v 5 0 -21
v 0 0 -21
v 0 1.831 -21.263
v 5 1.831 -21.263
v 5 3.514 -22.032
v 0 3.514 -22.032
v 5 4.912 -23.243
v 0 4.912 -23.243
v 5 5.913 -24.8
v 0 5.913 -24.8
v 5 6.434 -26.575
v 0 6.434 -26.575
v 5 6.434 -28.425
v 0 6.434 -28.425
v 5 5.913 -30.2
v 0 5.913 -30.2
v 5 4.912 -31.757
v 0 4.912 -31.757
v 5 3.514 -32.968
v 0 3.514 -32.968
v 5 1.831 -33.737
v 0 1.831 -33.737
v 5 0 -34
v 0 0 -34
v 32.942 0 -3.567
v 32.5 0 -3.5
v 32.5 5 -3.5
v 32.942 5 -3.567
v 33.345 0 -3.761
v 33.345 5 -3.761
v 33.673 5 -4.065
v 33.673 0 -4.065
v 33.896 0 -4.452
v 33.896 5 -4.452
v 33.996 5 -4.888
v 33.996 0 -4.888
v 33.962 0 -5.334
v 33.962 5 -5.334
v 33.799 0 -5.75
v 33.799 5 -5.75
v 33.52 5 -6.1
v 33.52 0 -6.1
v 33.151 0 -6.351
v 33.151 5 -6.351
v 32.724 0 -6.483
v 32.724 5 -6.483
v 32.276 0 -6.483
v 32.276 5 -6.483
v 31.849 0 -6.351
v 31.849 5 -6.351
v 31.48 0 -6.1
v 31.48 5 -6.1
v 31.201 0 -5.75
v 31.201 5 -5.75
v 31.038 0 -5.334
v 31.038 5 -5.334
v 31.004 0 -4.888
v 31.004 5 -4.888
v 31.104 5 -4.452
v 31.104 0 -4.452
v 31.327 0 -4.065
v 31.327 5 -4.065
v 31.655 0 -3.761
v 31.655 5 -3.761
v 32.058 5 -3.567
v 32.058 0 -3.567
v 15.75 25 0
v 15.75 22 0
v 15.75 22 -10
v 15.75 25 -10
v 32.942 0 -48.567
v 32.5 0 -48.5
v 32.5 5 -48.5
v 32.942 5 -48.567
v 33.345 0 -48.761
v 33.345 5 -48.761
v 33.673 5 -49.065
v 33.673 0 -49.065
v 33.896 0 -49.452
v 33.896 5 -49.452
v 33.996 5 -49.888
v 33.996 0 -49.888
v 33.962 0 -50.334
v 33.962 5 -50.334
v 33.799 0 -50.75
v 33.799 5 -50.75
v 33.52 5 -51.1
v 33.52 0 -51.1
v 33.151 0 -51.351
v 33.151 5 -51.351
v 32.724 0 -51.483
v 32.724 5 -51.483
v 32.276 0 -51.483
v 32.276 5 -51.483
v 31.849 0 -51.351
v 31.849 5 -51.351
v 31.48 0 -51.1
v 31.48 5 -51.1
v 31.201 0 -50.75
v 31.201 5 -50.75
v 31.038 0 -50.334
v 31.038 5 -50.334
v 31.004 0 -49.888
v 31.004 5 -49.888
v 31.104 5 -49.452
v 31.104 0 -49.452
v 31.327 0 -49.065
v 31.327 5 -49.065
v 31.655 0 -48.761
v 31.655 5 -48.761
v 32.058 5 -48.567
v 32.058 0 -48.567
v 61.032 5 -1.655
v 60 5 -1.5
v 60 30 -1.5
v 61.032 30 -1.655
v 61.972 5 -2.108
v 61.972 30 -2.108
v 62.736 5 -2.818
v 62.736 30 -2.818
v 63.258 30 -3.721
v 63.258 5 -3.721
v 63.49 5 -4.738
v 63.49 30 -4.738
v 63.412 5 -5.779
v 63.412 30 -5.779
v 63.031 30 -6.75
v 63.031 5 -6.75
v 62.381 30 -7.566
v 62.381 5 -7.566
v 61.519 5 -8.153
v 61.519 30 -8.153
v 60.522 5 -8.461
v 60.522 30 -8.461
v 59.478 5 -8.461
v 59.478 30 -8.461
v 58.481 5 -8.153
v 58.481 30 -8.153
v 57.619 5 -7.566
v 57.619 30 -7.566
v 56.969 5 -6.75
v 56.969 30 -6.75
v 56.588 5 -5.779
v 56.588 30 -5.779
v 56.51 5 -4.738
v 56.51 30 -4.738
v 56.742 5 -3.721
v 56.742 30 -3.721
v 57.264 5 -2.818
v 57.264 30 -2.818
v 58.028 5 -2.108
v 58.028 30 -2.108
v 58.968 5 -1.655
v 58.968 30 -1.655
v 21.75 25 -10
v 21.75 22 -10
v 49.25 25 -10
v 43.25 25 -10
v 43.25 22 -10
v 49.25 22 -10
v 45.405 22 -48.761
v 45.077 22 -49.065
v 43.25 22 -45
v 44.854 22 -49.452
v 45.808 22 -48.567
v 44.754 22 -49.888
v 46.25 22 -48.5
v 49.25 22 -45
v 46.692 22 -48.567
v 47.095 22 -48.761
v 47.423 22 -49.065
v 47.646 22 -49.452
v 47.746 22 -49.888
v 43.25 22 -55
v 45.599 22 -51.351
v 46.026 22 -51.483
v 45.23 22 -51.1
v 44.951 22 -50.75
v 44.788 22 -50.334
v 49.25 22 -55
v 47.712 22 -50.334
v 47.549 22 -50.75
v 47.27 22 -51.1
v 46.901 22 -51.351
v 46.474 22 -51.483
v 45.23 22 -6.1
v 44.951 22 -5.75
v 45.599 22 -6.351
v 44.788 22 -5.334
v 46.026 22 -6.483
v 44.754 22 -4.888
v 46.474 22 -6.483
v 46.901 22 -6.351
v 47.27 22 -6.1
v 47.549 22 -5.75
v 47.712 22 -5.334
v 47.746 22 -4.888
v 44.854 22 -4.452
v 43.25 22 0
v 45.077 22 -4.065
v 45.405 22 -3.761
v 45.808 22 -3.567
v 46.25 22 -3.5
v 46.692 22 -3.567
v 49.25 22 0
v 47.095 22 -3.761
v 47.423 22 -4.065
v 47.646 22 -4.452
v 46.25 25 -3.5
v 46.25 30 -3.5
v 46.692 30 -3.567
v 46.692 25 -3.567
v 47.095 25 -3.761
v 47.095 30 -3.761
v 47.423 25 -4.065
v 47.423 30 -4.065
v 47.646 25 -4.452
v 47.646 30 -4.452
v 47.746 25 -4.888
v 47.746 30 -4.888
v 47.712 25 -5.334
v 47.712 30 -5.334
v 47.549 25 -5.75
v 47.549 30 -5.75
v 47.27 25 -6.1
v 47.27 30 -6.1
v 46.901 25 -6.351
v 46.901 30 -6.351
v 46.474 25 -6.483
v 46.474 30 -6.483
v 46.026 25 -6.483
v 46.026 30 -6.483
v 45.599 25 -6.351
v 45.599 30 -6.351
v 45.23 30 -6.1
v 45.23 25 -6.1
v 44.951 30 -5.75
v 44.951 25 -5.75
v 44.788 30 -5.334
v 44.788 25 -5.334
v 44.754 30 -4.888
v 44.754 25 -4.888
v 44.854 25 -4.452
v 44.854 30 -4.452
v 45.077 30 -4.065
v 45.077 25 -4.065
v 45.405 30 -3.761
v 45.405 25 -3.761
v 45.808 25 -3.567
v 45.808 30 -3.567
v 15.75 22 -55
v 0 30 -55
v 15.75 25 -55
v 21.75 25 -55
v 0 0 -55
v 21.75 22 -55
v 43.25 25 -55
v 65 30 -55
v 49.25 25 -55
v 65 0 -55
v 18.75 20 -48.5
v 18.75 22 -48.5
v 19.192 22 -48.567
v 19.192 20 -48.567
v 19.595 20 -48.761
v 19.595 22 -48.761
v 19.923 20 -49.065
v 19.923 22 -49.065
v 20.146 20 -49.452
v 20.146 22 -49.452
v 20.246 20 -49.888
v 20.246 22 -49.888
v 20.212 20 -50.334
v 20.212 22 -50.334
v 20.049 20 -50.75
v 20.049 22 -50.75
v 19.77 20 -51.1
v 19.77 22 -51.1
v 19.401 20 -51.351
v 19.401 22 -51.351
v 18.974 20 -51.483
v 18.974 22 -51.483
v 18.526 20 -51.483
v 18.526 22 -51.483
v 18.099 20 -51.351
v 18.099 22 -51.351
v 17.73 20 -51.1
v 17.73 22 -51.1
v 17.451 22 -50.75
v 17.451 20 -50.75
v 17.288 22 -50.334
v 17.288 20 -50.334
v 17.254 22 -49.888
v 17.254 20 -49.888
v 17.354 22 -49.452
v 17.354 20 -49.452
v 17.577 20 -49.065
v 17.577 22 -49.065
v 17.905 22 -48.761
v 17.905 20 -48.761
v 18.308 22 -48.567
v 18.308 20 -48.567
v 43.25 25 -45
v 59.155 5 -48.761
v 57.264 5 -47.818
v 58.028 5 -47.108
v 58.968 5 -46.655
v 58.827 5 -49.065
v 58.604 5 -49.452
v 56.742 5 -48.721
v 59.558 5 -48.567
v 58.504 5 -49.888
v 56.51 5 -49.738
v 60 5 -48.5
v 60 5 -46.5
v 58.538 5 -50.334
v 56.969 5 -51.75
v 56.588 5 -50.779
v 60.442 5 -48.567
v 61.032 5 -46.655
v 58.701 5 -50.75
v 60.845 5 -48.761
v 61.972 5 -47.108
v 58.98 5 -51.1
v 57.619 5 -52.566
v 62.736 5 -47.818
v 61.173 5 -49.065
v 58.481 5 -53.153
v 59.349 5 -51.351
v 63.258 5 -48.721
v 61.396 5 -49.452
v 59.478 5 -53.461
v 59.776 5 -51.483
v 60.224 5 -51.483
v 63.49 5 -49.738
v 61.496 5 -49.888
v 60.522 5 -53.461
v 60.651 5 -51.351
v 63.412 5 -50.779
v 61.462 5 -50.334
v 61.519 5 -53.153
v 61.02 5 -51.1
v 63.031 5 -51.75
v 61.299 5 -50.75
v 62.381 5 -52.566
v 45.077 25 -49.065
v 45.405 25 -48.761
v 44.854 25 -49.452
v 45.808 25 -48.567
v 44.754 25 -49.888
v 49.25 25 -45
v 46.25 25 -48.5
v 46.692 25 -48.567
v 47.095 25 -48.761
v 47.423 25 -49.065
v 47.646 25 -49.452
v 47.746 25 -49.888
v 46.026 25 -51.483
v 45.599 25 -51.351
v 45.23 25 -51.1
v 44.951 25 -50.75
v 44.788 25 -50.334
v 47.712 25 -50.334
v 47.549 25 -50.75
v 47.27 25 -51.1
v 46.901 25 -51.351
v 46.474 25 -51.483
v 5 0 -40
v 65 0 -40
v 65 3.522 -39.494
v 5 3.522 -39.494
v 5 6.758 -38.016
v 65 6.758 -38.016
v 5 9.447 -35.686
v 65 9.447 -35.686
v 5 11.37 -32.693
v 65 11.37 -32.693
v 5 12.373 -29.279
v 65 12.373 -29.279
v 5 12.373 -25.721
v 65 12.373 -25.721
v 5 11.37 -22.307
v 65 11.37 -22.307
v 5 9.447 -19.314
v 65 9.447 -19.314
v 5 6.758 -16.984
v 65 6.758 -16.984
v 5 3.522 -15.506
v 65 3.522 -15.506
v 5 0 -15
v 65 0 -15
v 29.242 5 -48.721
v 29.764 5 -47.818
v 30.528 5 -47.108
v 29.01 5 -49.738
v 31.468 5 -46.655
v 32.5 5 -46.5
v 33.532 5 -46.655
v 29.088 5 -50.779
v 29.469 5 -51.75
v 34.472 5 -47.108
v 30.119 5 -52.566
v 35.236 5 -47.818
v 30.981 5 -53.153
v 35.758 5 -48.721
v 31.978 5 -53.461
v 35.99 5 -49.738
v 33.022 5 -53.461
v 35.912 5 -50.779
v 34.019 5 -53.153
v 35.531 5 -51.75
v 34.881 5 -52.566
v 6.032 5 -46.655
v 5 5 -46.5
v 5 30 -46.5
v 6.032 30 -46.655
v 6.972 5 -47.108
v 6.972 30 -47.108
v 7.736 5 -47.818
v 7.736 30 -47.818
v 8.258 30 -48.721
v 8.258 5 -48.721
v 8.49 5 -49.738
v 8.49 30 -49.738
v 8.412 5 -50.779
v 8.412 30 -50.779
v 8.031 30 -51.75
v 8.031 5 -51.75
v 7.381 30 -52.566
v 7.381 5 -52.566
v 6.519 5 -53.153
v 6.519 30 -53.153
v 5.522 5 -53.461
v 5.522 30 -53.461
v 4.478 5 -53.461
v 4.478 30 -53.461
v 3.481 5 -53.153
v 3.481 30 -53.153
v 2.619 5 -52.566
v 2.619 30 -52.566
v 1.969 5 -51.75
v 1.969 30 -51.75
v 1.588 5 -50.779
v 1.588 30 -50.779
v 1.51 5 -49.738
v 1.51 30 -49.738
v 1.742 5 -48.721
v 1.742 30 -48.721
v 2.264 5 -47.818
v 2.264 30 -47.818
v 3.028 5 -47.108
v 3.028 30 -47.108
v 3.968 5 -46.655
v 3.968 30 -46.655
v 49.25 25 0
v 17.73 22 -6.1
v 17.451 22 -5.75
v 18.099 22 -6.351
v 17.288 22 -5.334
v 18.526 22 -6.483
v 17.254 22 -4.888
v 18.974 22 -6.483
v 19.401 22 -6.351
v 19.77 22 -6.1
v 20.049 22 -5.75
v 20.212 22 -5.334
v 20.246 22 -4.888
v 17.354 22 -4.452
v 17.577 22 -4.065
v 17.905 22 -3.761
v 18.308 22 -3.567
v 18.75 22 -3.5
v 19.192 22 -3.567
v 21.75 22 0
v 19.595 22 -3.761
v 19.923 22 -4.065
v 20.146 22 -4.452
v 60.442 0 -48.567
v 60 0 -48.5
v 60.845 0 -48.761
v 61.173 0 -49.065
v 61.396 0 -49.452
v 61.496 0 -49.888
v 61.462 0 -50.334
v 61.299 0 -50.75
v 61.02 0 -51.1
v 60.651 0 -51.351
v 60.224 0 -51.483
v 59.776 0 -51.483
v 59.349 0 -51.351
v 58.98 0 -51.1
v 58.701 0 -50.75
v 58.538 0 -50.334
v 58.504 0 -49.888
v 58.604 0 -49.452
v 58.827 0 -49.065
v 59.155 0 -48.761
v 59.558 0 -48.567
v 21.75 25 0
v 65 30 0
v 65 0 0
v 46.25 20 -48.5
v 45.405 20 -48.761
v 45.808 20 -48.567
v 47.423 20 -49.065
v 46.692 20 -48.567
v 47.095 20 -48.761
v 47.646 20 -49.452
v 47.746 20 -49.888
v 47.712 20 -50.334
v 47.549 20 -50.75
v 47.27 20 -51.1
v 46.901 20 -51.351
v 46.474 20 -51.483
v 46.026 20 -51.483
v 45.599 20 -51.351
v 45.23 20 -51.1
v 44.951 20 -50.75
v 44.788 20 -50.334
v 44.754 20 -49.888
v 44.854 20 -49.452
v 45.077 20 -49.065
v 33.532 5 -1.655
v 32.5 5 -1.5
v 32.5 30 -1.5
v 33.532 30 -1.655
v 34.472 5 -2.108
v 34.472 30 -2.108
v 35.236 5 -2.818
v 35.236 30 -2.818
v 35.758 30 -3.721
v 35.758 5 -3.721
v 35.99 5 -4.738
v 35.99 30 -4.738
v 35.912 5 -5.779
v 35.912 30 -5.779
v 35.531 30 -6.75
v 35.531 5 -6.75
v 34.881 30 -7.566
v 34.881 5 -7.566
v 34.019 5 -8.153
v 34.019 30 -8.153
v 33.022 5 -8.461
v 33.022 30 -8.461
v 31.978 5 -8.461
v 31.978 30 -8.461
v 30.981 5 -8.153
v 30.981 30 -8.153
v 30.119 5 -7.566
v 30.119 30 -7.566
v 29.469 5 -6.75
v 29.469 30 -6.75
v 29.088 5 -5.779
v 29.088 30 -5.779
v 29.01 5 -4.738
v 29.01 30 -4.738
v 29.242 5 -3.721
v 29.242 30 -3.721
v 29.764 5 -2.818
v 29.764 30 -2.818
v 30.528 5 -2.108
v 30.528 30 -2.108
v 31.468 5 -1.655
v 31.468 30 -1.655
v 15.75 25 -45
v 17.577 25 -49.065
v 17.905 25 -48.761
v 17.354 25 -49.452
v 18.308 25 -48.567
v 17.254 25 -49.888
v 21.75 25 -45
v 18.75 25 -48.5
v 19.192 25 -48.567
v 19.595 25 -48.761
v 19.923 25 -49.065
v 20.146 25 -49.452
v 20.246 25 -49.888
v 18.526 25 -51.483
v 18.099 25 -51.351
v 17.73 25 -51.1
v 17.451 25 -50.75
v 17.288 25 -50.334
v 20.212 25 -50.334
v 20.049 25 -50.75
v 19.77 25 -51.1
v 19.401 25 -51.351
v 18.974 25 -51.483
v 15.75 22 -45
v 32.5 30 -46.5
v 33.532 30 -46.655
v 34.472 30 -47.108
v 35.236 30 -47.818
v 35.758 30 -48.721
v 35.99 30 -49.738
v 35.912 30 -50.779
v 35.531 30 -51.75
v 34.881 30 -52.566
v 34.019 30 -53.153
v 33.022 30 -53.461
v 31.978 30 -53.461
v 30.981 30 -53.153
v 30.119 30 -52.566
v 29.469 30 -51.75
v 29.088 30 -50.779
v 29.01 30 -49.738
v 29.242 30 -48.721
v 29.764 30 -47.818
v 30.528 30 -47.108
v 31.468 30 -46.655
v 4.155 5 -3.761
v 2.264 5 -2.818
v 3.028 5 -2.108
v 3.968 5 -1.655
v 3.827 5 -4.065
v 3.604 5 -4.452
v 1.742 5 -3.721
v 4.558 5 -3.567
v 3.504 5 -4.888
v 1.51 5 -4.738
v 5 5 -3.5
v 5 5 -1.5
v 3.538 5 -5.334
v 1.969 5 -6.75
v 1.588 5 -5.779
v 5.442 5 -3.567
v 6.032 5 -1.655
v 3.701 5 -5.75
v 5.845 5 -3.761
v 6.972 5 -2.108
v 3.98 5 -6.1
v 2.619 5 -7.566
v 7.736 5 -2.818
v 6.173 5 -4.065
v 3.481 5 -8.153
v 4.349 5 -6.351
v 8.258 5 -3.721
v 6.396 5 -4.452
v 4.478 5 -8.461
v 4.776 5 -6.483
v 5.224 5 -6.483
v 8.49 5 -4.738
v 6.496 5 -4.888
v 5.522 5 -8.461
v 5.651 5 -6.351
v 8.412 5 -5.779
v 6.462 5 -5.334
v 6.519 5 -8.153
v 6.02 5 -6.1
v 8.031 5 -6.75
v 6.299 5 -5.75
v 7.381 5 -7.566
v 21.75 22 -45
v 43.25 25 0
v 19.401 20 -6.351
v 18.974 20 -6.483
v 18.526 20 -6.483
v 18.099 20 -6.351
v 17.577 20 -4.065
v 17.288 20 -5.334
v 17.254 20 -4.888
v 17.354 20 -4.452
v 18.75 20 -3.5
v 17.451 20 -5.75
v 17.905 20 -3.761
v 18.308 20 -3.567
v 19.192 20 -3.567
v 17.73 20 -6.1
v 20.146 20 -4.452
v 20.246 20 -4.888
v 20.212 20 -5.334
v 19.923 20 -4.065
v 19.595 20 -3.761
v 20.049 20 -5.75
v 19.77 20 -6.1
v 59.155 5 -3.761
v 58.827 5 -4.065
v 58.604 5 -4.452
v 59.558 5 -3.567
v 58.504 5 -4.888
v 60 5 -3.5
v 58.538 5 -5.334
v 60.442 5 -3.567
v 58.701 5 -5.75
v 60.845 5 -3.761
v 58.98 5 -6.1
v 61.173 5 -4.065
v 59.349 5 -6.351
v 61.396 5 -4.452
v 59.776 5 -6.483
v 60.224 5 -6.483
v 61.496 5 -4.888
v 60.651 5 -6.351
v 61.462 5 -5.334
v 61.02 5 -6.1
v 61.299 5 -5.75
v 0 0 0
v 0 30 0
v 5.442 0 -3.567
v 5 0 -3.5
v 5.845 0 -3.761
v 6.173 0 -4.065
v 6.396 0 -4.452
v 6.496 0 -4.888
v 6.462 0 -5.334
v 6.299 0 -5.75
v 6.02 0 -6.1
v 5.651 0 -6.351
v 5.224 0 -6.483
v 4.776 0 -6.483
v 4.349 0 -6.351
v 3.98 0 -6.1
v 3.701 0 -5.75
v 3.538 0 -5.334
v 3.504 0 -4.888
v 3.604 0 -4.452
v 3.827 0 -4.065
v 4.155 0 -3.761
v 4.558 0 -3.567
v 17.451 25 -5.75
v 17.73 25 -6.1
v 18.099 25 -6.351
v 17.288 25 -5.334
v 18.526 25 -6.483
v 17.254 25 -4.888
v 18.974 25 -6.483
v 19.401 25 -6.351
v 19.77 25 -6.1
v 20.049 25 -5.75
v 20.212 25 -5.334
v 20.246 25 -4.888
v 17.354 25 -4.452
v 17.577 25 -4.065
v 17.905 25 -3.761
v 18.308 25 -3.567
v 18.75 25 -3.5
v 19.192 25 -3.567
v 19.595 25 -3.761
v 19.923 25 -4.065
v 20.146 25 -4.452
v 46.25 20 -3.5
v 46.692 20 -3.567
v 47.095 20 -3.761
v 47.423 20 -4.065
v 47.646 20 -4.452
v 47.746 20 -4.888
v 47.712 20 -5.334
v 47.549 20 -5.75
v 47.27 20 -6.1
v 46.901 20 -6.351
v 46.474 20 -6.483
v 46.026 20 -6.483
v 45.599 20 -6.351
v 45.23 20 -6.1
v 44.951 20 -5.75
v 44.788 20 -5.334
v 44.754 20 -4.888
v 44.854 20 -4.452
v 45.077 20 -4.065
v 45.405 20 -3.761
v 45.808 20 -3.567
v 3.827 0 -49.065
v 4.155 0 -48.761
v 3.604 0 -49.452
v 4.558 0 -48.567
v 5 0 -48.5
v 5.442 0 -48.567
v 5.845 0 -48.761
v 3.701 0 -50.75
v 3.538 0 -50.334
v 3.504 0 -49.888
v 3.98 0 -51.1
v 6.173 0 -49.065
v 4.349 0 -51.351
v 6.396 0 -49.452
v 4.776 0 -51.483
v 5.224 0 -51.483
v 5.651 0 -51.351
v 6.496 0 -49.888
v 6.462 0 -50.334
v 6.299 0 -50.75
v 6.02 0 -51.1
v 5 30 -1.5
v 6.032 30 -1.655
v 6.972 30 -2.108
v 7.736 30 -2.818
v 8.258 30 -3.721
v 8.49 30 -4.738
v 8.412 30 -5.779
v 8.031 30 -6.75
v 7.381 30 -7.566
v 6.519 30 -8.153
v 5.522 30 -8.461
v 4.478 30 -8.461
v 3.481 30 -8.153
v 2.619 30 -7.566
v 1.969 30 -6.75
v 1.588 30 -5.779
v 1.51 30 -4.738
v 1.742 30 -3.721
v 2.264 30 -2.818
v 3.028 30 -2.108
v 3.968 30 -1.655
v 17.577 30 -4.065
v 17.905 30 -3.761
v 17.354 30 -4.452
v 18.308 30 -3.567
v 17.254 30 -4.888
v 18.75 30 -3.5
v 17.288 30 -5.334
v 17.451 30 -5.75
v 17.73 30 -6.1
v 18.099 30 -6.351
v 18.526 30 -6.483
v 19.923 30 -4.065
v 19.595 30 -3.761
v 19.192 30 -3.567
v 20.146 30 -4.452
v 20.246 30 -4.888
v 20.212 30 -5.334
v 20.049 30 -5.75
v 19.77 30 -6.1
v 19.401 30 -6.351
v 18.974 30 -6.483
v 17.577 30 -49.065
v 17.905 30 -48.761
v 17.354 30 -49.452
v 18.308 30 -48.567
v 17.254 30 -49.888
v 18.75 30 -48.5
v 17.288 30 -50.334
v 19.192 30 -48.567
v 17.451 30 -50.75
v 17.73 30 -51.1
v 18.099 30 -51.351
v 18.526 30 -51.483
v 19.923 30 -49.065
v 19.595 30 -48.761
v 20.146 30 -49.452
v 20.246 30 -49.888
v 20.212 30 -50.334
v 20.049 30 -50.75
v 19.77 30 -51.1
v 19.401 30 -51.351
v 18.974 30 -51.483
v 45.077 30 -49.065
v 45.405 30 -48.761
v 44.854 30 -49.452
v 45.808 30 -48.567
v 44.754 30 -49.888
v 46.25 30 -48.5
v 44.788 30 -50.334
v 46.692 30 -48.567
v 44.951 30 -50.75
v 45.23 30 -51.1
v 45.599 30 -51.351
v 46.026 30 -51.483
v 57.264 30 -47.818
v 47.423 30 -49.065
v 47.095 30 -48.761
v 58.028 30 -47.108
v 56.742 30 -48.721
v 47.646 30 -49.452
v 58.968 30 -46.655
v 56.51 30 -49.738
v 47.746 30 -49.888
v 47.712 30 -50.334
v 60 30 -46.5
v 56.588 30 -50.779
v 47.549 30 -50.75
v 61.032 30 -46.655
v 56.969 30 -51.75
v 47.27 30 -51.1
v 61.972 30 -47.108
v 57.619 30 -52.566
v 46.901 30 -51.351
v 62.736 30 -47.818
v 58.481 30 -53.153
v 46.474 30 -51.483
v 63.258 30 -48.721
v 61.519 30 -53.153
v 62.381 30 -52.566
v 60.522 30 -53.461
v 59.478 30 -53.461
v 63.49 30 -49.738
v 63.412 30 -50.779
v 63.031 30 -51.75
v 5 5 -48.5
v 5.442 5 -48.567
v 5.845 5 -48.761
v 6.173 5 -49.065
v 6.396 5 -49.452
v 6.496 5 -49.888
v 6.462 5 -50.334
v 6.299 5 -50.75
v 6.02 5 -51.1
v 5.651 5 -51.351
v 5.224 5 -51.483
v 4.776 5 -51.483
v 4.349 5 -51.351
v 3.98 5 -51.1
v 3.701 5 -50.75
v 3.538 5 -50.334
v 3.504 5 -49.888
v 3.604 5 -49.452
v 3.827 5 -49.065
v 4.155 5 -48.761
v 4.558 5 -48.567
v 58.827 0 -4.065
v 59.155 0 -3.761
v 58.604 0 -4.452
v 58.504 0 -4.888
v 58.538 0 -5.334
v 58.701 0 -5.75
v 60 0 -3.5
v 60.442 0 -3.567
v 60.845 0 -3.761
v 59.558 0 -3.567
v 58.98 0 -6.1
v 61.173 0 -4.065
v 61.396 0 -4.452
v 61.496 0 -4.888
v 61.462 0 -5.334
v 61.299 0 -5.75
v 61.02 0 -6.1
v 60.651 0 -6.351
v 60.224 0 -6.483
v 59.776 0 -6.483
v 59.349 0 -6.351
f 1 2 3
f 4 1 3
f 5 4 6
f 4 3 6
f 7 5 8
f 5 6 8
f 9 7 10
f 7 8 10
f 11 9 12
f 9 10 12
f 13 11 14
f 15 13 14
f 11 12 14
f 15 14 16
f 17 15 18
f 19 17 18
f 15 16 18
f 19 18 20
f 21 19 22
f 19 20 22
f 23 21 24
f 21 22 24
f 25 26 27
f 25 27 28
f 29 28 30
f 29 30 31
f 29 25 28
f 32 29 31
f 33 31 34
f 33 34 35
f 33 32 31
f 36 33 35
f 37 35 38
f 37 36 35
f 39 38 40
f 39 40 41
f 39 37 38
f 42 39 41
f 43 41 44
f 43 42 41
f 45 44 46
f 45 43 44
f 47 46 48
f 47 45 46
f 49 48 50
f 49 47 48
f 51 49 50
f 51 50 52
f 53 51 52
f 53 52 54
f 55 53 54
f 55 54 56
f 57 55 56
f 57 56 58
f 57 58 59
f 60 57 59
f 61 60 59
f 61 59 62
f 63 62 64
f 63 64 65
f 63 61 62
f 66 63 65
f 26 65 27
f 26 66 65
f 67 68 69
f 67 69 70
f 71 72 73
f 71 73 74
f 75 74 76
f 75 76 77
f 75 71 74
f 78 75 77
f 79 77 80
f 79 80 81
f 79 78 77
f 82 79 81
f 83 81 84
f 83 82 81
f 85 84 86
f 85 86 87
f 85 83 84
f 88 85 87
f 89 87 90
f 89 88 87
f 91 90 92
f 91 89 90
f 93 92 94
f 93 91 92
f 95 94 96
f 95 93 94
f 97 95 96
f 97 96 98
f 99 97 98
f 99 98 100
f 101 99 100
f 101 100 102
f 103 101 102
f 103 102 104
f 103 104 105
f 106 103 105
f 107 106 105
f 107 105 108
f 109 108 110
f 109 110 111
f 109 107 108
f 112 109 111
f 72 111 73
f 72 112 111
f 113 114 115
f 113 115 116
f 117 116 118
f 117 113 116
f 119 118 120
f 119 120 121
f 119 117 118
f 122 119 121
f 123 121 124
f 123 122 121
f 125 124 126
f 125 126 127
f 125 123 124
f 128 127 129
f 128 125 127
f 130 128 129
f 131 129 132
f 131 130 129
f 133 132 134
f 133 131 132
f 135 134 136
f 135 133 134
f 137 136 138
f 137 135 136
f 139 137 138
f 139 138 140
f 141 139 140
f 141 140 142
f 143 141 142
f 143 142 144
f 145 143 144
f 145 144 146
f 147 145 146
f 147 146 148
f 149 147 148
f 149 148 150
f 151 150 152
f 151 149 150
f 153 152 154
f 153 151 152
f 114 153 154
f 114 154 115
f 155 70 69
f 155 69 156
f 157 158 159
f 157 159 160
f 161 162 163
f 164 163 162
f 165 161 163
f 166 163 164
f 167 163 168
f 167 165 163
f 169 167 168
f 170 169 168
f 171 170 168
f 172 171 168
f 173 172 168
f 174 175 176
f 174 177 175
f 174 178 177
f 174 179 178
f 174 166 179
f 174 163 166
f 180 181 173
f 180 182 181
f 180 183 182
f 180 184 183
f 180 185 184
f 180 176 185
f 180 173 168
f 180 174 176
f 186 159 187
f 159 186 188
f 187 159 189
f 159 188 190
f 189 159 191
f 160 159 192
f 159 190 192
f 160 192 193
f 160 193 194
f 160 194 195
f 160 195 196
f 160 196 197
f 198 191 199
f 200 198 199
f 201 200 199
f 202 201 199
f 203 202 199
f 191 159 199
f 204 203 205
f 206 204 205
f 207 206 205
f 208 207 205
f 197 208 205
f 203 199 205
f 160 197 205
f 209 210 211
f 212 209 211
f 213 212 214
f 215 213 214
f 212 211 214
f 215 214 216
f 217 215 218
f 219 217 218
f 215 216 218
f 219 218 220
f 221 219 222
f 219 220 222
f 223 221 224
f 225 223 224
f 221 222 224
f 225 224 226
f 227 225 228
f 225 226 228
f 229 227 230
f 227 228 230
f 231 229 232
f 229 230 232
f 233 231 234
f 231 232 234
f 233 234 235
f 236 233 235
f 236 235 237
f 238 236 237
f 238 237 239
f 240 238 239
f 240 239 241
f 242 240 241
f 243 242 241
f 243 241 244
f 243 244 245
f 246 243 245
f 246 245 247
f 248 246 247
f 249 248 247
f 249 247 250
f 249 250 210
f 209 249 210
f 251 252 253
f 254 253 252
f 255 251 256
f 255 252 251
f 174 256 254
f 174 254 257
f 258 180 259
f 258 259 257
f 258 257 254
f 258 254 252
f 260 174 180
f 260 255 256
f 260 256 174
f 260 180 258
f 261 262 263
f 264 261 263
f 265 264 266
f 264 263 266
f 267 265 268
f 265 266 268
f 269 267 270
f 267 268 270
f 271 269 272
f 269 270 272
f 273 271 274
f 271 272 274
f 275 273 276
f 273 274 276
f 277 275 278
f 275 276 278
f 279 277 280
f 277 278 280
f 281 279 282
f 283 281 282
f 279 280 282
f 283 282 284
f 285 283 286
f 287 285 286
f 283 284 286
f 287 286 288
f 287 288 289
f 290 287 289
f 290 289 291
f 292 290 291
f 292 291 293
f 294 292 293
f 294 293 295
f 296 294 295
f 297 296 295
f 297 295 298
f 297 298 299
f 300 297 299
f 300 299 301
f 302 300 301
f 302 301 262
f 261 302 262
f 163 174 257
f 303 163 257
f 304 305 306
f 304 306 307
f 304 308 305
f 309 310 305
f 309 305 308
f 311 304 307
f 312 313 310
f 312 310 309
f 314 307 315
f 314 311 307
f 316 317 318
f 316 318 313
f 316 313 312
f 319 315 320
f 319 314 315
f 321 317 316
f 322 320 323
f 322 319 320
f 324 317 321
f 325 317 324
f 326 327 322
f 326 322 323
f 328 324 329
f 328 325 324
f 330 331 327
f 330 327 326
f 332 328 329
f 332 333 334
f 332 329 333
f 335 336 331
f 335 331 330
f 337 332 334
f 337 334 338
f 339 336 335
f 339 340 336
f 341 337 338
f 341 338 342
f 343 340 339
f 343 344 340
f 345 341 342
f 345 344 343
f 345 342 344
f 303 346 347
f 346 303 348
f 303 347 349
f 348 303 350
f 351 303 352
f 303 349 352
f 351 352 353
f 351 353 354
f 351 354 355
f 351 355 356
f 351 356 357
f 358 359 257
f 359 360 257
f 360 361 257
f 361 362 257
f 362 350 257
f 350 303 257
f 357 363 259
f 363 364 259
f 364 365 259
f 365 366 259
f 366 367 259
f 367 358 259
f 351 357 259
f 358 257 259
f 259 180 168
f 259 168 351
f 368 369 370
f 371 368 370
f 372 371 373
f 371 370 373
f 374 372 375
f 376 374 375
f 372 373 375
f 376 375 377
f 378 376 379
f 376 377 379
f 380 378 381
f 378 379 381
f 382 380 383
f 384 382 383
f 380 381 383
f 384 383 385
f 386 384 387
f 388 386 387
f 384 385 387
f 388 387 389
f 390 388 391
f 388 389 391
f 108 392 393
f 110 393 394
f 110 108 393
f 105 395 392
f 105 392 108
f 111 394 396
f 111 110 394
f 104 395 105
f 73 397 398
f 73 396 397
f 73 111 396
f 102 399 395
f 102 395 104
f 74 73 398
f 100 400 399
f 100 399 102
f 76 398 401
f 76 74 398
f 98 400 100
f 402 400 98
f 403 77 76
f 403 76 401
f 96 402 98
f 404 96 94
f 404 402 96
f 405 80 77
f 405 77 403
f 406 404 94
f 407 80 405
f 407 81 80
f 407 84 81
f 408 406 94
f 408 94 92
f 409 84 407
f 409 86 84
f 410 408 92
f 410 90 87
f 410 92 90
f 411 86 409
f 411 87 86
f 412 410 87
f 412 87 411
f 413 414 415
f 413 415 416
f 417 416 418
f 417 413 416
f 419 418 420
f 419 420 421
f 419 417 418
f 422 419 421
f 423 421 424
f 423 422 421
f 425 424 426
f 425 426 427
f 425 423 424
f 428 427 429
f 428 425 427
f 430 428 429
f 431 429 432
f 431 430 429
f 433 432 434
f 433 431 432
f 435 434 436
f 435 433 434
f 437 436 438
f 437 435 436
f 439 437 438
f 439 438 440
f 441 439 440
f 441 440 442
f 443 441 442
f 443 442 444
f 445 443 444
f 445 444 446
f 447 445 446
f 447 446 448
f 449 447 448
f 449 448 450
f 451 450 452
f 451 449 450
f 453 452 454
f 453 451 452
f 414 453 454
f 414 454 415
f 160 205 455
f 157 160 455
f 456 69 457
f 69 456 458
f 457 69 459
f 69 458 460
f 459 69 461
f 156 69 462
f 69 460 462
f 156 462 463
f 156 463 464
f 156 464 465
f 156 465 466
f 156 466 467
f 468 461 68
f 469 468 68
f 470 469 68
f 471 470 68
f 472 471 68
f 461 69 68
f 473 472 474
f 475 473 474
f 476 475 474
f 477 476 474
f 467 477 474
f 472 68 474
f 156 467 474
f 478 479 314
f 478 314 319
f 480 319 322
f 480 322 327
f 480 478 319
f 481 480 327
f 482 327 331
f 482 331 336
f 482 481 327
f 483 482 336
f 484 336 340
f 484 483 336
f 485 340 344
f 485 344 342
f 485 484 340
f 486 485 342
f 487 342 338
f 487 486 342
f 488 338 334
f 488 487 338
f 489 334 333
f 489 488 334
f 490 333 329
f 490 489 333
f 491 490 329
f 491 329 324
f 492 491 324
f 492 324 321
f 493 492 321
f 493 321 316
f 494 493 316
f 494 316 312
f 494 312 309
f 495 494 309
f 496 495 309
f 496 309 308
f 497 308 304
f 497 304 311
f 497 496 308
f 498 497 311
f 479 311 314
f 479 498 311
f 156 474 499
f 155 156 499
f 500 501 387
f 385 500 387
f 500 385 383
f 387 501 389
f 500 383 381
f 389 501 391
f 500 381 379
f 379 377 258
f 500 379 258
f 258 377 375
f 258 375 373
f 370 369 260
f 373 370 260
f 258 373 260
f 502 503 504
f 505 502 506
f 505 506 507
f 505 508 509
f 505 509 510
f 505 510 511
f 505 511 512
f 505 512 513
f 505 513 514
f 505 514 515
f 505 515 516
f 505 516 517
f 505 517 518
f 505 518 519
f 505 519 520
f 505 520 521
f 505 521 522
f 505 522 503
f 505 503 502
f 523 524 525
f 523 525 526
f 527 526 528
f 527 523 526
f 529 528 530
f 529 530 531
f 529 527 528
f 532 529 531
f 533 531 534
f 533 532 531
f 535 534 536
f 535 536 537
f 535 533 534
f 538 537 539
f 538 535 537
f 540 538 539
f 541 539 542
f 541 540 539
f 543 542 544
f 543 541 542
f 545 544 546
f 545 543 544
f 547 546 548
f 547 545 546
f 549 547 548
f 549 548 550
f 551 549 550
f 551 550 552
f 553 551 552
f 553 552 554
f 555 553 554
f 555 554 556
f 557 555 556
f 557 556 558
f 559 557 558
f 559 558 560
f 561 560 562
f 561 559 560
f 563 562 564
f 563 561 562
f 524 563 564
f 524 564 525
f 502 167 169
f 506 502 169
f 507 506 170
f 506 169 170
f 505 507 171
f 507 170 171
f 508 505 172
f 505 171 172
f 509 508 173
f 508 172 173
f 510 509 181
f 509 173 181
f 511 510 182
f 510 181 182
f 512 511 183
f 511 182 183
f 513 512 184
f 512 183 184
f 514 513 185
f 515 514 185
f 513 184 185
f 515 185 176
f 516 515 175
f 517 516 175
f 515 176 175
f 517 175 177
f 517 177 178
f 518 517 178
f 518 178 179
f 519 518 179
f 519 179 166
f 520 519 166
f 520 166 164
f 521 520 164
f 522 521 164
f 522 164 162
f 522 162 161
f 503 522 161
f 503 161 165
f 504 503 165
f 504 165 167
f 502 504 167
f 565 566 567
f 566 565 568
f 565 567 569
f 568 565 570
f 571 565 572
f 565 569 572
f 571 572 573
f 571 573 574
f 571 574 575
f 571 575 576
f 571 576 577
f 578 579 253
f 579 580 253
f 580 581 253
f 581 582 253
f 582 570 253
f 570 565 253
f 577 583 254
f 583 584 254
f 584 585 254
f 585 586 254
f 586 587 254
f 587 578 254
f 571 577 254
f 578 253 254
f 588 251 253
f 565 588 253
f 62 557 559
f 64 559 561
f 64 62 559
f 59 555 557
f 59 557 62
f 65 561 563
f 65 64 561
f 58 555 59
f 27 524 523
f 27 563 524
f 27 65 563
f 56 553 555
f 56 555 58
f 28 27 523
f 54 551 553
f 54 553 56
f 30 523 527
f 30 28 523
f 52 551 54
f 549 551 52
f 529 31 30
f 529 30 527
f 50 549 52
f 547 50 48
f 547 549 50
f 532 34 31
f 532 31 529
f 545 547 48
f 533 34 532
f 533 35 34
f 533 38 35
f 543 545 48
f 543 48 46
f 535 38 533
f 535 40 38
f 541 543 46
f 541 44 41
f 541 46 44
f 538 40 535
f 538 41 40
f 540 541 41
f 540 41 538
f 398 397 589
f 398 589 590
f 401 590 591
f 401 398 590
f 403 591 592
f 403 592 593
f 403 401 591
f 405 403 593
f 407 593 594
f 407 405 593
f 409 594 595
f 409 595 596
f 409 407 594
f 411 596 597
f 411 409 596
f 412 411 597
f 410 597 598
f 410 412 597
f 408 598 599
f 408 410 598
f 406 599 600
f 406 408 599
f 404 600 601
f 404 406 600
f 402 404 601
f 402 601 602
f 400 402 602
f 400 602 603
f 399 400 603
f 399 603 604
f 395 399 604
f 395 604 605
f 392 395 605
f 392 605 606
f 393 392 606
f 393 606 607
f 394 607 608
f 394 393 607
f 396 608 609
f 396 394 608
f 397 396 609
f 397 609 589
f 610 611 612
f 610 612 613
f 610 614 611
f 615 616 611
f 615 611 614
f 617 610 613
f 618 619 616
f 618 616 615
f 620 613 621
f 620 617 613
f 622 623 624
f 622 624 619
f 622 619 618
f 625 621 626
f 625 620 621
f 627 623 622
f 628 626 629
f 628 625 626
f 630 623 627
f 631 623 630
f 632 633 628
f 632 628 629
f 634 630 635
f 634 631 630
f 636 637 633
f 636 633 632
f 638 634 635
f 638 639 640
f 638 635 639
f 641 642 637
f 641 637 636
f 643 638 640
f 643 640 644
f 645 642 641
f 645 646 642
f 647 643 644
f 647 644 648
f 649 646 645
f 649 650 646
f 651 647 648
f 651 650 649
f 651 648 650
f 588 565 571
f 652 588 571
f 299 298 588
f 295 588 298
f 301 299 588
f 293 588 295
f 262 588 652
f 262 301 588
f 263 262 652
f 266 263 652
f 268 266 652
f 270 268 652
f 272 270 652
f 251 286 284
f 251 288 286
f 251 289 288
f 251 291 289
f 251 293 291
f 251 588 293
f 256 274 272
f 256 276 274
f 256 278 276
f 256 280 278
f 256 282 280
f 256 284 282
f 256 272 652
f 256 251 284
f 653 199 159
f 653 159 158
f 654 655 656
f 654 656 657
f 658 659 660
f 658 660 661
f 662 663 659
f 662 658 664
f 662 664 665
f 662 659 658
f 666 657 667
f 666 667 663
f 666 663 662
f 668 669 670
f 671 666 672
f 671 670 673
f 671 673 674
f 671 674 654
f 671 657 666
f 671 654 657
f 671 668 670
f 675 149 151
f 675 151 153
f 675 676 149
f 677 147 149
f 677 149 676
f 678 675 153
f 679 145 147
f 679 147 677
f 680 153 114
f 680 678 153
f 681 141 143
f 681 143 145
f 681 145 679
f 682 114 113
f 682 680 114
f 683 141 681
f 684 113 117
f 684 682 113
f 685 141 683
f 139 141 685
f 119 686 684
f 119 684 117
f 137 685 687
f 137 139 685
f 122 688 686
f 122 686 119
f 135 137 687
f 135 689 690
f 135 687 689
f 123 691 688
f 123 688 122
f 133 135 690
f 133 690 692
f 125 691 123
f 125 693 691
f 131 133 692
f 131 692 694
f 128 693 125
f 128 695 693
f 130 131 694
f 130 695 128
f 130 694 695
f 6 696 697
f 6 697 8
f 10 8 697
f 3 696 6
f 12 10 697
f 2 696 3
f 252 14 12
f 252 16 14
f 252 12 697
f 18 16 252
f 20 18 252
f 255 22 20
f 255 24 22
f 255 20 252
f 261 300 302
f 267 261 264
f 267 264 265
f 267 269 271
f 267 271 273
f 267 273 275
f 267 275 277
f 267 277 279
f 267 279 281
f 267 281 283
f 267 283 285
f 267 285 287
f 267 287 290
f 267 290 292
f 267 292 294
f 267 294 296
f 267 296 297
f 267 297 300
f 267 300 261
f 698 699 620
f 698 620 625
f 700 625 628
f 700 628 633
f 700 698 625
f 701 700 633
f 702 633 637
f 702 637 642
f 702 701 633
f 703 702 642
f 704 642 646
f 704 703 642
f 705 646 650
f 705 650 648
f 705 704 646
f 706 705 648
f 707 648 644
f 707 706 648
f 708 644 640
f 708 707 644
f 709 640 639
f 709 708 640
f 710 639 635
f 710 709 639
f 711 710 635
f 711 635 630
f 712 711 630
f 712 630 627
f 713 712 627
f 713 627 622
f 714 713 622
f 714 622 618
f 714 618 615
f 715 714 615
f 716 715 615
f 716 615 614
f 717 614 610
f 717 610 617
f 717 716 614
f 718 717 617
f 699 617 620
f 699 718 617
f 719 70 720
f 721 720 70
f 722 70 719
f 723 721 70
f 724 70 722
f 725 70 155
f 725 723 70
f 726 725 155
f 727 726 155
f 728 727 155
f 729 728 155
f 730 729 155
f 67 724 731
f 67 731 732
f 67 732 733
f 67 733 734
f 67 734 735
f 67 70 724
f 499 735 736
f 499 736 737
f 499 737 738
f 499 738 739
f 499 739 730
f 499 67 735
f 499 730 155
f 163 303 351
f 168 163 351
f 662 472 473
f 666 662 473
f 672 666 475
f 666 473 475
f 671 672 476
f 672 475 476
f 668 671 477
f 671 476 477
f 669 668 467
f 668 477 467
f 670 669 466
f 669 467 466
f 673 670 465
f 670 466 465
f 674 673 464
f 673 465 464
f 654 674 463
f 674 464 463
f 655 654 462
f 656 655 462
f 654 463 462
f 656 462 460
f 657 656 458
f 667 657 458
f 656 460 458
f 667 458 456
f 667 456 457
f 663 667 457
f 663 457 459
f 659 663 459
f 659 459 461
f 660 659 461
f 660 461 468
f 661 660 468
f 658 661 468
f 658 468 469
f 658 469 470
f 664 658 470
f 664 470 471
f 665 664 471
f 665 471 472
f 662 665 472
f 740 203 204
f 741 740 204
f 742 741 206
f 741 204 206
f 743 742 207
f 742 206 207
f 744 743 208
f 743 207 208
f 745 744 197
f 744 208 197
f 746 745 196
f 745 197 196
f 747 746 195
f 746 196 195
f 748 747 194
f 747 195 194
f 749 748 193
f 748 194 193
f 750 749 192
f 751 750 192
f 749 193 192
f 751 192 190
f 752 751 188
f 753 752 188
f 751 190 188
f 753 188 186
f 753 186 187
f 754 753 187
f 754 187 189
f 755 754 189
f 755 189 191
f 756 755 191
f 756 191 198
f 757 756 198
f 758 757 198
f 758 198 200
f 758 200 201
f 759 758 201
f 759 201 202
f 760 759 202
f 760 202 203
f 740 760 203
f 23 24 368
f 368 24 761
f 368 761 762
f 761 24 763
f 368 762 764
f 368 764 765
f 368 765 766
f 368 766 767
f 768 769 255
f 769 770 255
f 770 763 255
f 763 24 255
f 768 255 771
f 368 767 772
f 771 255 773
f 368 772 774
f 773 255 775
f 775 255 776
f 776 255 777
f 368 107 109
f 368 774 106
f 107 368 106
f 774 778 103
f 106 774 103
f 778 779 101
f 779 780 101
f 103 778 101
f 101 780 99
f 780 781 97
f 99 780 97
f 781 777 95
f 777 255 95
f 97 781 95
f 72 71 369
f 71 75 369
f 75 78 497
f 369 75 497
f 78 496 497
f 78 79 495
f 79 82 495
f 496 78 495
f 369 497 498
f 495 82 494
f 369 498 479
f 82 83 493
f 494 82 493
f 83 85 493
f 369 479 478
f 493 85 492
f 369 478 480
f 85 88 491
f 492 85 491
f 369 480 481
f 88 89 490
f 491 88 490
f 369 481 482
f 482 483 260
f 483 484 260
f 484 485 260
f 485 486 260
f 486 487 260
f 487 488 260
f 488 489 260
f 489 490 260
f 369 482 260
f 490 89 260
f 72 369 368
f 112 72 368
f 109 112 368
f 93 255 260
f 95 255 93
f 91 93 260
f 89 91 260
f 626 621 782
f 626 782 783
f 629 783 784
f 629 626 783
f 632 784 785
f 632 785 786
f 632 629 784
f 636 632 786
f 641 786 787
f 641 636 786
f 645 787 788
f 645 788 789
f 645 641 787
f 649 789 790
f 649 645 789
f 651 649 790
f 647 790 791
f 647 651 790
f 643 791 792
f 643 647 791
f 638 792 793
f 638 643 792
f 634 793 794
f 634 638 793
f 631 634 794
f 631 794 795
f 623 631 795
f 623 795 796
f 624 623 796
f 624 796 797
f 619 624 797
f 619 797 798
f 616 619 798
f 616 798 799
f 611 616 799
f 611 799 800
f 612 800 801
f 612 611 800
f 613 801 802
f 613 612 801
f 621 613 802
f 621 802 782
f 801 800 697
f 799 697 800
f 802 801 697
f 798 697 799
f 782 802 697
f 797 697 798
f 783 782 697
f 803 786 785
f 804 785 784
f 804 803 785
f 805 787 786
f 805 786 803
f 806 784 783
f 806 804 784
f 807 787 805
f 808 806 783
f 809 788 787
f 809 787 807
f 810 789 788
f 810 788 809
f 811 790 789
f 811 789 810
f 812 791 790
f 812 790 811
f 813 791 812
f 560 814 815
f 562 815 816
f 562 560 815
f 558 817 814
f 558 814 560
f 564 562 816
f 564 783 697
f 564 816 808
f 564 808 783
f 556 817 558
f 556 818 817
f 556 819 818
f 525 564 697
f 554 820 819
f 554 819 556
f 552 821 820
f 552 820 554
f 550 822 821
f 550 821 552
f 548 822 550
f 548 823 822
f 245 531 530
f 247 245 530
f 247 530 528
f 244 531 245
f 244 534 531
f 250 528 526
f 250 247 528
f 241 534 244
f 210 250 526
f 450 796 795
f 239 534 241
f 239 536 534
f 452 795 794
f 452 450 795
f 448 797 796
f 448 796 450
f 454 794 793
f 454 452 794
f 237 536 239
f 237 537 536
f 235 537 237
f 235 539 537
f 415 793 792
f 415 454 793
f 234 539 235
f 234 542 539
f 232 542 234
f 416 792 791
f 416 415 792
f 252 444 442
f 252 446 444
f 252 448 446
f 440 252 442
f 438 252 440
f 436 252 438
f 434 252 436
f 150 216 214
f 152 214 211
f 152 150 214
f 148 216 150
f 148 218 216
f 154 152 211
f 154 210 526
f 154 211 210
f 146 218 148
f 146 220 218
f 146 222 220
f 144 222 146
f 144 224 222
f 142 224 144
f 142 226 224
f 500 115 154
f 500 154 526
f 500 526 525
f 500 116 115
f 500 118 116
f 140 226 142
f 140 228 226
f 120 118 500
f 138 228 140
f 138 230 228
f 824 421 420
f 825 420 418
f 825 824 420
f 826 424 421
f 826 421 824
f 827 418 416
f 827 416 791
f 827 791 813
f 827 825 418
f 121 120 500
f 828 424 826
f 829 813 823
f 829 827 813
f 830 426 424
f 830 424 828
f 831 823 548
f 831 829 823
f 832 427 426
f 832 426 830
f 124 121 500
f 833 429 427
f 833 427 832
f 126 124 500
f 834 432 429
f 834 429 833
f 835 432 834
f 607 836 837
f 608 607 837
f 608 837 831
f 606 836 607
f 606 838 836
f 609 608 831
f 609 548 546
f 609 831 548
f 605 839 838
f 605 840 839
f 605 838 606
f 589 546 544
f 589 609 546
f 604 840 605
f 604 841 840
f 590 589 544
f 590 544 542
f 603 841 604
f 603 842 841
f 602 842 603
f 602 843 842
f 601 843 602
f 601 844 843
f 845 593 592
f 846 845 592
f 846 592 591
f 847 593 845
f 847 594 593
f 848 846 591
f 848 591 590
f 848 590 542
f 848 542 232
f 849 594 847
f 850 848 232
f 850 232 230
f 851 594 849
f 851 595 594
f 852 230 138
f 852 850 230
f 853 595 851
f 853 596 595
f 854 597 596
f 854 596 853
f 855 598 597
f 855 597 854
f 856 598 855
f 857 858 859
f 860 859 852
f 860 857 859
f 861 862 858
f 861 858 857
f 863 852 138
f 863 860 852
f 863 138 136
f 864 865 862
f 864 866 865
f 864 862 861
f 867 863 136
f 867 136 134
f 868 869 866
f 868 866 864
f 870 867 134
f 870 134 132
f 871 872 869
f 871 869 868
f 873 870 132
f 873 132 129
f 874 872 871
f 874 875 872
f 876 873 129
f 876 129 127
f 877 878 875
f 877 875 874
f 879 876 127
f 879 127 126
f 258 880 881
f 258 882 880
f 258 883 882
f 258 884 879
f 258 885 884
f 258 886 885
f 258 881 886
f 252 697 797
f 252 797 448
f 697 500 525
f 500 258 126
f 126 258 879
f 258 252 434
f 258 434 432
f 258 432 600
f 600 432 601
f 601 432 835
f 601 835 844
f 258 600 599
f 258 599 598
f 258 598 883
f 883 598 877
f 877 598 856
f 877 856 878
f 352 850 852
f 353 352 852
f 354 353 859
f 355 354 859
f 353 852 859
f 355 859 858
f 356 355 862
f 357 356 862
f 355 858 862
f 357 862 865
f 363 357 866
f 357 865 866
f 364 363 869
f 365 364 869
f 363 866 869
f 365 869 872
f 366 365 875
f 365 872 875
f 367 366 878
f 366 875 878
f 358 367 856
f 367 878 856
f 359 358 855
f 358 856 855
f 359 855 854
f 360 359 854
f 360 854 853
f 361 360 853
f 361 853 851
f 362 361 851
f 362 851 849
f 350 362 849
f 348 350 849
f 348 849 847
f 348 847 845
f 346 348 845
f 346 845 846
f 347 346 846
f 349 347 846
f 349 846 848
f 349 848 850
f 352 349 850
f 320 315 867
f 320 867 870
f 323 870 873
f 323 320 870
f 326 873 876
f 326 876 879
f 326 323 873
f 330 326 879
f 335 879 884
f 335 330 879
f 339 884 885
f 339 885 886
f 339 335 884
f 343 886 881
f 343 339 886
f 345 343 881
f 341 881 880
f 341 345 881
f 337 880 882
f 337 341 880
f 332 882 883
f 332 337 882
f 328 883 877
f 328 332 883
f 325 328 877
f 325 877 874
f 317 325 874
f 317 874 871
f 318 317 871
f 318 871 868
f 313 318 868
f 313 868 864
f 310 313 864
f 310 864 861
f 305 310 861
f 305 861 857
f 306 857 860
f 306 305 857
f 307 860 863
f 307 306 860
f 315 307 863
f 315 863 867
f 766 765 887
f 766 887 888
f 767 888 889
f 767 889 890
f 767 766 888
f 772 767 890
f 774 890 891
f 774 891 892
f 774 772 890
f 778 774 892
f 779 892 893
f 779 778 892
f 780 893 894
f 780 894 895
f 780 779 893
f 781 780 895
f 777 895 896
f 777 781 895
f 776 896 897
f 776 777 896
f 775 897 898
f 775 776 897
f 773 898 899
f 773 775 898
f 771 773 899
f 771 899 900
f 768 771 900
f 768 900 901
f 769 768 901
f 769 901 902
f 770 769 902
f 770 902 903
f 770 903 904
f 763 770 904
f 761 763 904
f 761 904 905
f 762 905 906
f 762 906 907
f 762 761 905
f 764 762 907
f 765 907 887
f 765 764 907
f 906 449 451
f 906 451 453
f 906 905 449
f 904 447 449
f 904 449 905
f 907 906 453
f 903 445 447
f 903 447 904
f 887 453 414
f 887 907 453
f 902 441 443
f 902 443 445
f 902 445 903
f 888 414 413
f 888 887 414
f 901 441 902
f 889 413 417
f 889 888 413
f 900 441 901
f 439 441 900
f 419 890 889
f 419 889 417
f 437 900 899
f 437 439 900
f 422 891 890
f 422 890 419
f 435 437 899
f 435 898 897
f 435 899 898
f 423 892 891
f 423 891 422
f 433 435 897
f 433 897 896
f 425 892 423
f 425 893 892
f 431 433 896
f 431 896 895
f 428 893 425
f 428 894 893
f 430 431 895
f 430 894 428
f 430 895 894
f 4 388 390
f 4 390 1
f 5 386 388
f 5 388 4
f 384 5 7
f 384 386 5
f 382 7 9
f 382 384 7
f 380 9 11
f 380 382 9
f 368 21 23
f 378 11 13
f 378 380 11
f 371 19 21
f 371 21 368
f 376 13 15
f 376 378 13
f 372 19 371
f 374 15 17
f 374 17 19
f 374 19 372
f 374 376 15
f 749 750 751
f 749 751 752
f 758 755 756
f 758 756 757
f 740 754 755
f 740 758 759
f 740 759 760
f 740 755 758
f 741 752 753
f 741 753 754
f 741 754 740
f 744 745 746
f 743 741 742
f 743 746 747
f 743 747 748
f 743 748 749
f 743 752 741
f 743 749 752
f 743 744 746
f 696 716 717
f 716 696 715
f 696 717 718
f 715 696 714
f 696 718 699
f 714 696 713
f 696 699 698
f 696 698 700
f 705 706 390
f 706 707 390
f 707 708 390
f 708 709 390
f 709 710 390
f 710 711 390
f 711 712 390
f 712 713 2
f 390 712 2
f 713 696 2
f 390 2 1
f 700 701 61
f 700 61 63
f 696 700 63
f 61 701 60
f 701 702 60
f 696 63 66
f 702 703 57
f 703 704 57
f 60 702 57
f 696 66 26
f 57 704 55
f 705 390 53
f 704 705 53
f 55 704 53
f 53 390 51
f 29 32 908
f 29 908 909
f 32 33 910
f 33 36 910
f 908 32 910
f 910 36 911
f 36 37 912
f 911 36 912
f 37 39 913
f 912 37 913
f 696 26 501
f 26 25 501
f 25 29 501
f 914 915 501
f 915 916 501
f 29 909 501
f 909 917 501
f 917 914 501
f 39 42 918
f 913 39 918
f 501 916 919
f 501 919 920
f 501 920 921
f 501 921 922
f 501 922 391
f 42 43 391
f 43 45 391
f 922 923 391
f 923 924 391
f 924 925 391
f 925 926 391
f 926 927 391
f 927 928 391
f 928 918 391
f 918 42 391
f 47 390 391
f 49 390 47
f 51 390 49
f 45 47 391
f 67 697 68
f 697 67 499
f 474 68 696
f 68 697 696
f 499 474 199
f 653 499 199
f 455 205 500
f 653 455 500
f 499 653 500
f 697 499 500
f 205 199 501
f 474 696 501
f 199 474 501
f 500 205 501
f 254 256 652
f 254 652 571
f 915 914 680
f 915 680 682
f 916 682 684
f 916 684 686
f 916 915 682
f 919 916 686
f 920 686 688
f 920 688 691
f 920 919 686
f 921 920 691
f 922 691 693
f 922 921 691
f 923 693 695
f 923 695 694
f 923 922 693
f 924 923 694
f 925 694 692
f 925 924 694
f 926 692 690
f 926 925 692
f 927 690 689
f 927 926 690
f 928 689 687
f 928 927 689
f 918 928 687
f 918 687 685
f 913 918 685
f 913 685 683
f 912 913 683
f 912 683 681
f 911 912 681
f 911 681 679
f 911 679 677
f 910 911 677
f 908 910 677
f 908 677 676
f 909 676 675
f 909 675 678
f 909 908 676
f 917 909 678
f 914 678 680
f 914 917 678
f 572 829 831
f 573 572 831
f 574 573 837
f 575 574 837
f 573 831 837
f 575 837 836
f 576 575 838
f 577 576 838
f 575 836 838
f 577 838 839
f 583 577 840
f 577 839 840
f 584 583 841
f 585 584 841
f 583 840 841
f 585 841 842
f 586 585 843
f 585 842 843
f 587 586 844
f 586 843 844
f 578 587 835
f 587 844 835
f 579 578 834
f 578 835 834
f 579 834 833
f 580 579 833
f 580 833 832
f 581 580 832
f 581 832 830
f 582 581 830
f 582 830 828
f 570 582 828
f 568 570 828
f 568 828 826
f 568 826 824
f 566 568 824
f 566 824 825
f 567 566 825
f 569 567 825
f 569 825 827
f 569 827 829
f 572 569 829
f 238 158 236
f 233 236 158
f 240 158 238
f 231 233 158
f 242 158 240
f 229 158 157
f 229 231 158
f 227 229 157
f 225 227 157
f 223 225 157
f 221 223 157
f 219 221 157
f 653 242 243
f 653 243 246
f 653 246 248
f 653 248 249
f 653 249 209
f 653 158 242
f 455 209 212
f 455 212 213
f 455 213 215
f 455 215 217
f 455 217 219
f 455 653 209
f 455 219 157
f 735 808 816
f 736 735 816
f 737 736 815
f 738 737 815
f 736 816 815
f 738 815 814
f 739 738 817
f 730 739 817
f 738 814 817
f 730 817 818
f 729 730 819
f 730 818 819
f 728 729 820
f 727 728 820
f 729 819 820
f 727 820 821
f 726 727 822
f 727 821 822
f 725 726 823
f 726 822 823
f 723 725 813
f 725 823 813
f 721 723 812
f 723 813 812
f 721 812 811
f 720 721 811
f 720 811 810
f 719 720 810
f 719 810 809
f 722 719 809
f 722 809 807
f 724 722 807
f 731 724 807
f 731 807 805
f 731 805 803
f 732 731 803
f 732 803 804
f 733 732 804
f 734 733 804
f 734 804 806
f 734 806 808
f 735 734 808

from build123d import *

# Parameters (mm, degrees)
CROQUIS2_W              = 65
CROQUIS2_H              = 55
CROQUIS2_R              = 1.5
SALIENTE_EXTRUIR1_DEPTH = 5
CROQUIS4_W              = 65
CROQUIS4_H              = 55
CROQUIS4_R              = 3.5
SALIENTE_EXTRUIR2_DEPTH = 25
CROQUIS6_R              = 12.5
CORTAR_EXTRUIR1_DEPTH   = 60
CROQUIS7_R              = 6.5
CORTAR_EXTRUIR2_DEPTH   = 5
CROQUIS8_R              = 1.5
CORTAR_EXTRUIR3_DEPTH   = 10
CROQUIS9_W              = 6
CROQUIS9_H              = 3
CORTAR_EXTRUIR6_DEPTH   = 10


with BuildPart() as part:
    # Croquis2 → Saliente-Extruir1 (new body)
    with BuildSketch(Plane(origin=(0, 0, 0), x_dir=(1, 0, 0), z_dir=(0, 1, 0))):
        with Locations((32.5, 27.5)):
            Rectangle(CROQUIS2_W, CROQUIS2_H)
        with Locations(Location((5, 50, 0), (0, 0, 270))):
            Circle(CROQUIS2_R, mode=Mode.SUBTRACT)
        with Locations(Location((32.5, 50, 0), (0, 0, 270))):
            Circle(CROQUIS2_R, mode=Mode.SUBTRACT)
        with Locations(Location((60, 50, 0), (0, 0, 270))):
            Circle(CROQUIS2_R, mode=Mode.SUBTRACT)
        with Locations(Location((5, 5, 0), (0, 0, 270))):
            Circle(CROQUIS2_R, mode=Mode.SUBTRACT)
        with Locations(Location((32.5, 5, 0), (0, 0, 270))):
            Circle(CROQUIS2_R, mode=Mode.SUBTRACT)
        with Locations(Location((60, 5, 0), (0, 0, 270))):
            Circle(CROQUIS2_R, mode=Mode.SUBTRACT)
    extrude(amount=SALIENTE_EXTRUIR1_DEPTH)

    # Croquis4 → Saliente-Extruir2 (add)
    with BuildSketch(Plane(origin=(0, 5, 0), x_dir=(1, 0, 0), z_dir=(0, 1, 0))):
        with Locations((32.5, 27.5)):
            Rectangle(CROQUIS4_W, CROQUIS4_H)
        with Locations(Location((5, 50, 0), (0, 0, 270))):
            Circle(CROQUIS4_R, mode=Mode.SUBTRACT)
        with Locations(Location((32.5, 50, 0), (0, 0, 270))):
            Circle(CROQUIS4_R, mode=Mode.SUBTRACT)
        with Locations(Location((60, 50, 0), (0, 0, 270))):
            Circle(CROQUIS4_R, mode=Mode.SUBTRACT)
        with Locations(Location((60, 5, 0), (0, 0, 270))):
            Circle(CROQUIS4_R, mode=Mode.SUBTRACT)
        with Locations(Location((32.5, 5, 0), (0, 0, 270))):
            Circle(CROQUIS4_R, mode=Mode.SUBTRACT)
        with Locations(Location((5, 5, 0), (0, 0, 270))):
            Circle(CROQUIS4_R, mode=Mode.SUBTRACT)
    extrude(amount=SALIENTE_EXTRUIR2_DEPTH)

    # Croquis6 → Cortar-Extruir1 (cut)
    with BuildSketch(Plane(origin=(65, 0, 0), x_dir=(0, 0, -1), z_dir=(1, 0, 0))):
        with Locations((27.5, 0)):
            Circle(CROQUIS6_R)
    extrude(amount=-CORTAR_EXTRUIR1_DEPTH, mode=Mode.SUBTRACT)

    # Croquis7 → Cortar-Extruir2 (cut)
    with BuildSketch(Plane.ZY):
        with Locations((-27.5, 0)):
            Circle(CROQUIS7_R)
    extrude(amount=-CORTAR_EXTRUIR2_DEPTH, mode=Mode.SUBTRACT)

    # Croquis8 → Cortar-Extruir3 (cut)
    with BuildSketch(Plane(origin=(0, 30, 0), x_dir=(1, 0, 0), z_dir=(0, 1, 0))):
        with Locations(Location((18.75, 50, 0), (0, 0, 270))):
            Circle(CROQUIS8_R)
        with Locations(Location((46.25, 50, 0), (0, 0, 270))):
            Circle(CROQUIS8_R)
        with Locations(Location((46.25, 5, 0), (0, 0, 270))):
            Circle(CROQUIS8_R)
        with Locations(Location((18.75, 5, 0), (0, 0, 270))):
            Circle(CROQUIS8_R)
    extrude(amount=-CORTAR_EXTRUIR3_DEPTH, mode=Mode.SUBTRACT)

    # Croquis9 → Cortar-Extruir6 (cut)
    with BuildSketch(Plane.XY):
        with Locations((18.75, 23.5)):
            Rectangle(CROQUIS9_W, CROQUIS9_H)
        with Locations((46.25, 23.5)):
            Rectangle(CROQUIS9_W, CROQUIS9_H)
    cortar_extruir6 = extrude(amount=-CORTAR_EXTRUIR6_DEPTH, mode=Mode.SUBTRACT)

    # Simetría1: Cortar-Extruir6 across plane
    add(cortar_extruir6.mirror(Plane.XY.offset(-27.5)), mode=Mode.SUBTRACT)


solid = part.part
